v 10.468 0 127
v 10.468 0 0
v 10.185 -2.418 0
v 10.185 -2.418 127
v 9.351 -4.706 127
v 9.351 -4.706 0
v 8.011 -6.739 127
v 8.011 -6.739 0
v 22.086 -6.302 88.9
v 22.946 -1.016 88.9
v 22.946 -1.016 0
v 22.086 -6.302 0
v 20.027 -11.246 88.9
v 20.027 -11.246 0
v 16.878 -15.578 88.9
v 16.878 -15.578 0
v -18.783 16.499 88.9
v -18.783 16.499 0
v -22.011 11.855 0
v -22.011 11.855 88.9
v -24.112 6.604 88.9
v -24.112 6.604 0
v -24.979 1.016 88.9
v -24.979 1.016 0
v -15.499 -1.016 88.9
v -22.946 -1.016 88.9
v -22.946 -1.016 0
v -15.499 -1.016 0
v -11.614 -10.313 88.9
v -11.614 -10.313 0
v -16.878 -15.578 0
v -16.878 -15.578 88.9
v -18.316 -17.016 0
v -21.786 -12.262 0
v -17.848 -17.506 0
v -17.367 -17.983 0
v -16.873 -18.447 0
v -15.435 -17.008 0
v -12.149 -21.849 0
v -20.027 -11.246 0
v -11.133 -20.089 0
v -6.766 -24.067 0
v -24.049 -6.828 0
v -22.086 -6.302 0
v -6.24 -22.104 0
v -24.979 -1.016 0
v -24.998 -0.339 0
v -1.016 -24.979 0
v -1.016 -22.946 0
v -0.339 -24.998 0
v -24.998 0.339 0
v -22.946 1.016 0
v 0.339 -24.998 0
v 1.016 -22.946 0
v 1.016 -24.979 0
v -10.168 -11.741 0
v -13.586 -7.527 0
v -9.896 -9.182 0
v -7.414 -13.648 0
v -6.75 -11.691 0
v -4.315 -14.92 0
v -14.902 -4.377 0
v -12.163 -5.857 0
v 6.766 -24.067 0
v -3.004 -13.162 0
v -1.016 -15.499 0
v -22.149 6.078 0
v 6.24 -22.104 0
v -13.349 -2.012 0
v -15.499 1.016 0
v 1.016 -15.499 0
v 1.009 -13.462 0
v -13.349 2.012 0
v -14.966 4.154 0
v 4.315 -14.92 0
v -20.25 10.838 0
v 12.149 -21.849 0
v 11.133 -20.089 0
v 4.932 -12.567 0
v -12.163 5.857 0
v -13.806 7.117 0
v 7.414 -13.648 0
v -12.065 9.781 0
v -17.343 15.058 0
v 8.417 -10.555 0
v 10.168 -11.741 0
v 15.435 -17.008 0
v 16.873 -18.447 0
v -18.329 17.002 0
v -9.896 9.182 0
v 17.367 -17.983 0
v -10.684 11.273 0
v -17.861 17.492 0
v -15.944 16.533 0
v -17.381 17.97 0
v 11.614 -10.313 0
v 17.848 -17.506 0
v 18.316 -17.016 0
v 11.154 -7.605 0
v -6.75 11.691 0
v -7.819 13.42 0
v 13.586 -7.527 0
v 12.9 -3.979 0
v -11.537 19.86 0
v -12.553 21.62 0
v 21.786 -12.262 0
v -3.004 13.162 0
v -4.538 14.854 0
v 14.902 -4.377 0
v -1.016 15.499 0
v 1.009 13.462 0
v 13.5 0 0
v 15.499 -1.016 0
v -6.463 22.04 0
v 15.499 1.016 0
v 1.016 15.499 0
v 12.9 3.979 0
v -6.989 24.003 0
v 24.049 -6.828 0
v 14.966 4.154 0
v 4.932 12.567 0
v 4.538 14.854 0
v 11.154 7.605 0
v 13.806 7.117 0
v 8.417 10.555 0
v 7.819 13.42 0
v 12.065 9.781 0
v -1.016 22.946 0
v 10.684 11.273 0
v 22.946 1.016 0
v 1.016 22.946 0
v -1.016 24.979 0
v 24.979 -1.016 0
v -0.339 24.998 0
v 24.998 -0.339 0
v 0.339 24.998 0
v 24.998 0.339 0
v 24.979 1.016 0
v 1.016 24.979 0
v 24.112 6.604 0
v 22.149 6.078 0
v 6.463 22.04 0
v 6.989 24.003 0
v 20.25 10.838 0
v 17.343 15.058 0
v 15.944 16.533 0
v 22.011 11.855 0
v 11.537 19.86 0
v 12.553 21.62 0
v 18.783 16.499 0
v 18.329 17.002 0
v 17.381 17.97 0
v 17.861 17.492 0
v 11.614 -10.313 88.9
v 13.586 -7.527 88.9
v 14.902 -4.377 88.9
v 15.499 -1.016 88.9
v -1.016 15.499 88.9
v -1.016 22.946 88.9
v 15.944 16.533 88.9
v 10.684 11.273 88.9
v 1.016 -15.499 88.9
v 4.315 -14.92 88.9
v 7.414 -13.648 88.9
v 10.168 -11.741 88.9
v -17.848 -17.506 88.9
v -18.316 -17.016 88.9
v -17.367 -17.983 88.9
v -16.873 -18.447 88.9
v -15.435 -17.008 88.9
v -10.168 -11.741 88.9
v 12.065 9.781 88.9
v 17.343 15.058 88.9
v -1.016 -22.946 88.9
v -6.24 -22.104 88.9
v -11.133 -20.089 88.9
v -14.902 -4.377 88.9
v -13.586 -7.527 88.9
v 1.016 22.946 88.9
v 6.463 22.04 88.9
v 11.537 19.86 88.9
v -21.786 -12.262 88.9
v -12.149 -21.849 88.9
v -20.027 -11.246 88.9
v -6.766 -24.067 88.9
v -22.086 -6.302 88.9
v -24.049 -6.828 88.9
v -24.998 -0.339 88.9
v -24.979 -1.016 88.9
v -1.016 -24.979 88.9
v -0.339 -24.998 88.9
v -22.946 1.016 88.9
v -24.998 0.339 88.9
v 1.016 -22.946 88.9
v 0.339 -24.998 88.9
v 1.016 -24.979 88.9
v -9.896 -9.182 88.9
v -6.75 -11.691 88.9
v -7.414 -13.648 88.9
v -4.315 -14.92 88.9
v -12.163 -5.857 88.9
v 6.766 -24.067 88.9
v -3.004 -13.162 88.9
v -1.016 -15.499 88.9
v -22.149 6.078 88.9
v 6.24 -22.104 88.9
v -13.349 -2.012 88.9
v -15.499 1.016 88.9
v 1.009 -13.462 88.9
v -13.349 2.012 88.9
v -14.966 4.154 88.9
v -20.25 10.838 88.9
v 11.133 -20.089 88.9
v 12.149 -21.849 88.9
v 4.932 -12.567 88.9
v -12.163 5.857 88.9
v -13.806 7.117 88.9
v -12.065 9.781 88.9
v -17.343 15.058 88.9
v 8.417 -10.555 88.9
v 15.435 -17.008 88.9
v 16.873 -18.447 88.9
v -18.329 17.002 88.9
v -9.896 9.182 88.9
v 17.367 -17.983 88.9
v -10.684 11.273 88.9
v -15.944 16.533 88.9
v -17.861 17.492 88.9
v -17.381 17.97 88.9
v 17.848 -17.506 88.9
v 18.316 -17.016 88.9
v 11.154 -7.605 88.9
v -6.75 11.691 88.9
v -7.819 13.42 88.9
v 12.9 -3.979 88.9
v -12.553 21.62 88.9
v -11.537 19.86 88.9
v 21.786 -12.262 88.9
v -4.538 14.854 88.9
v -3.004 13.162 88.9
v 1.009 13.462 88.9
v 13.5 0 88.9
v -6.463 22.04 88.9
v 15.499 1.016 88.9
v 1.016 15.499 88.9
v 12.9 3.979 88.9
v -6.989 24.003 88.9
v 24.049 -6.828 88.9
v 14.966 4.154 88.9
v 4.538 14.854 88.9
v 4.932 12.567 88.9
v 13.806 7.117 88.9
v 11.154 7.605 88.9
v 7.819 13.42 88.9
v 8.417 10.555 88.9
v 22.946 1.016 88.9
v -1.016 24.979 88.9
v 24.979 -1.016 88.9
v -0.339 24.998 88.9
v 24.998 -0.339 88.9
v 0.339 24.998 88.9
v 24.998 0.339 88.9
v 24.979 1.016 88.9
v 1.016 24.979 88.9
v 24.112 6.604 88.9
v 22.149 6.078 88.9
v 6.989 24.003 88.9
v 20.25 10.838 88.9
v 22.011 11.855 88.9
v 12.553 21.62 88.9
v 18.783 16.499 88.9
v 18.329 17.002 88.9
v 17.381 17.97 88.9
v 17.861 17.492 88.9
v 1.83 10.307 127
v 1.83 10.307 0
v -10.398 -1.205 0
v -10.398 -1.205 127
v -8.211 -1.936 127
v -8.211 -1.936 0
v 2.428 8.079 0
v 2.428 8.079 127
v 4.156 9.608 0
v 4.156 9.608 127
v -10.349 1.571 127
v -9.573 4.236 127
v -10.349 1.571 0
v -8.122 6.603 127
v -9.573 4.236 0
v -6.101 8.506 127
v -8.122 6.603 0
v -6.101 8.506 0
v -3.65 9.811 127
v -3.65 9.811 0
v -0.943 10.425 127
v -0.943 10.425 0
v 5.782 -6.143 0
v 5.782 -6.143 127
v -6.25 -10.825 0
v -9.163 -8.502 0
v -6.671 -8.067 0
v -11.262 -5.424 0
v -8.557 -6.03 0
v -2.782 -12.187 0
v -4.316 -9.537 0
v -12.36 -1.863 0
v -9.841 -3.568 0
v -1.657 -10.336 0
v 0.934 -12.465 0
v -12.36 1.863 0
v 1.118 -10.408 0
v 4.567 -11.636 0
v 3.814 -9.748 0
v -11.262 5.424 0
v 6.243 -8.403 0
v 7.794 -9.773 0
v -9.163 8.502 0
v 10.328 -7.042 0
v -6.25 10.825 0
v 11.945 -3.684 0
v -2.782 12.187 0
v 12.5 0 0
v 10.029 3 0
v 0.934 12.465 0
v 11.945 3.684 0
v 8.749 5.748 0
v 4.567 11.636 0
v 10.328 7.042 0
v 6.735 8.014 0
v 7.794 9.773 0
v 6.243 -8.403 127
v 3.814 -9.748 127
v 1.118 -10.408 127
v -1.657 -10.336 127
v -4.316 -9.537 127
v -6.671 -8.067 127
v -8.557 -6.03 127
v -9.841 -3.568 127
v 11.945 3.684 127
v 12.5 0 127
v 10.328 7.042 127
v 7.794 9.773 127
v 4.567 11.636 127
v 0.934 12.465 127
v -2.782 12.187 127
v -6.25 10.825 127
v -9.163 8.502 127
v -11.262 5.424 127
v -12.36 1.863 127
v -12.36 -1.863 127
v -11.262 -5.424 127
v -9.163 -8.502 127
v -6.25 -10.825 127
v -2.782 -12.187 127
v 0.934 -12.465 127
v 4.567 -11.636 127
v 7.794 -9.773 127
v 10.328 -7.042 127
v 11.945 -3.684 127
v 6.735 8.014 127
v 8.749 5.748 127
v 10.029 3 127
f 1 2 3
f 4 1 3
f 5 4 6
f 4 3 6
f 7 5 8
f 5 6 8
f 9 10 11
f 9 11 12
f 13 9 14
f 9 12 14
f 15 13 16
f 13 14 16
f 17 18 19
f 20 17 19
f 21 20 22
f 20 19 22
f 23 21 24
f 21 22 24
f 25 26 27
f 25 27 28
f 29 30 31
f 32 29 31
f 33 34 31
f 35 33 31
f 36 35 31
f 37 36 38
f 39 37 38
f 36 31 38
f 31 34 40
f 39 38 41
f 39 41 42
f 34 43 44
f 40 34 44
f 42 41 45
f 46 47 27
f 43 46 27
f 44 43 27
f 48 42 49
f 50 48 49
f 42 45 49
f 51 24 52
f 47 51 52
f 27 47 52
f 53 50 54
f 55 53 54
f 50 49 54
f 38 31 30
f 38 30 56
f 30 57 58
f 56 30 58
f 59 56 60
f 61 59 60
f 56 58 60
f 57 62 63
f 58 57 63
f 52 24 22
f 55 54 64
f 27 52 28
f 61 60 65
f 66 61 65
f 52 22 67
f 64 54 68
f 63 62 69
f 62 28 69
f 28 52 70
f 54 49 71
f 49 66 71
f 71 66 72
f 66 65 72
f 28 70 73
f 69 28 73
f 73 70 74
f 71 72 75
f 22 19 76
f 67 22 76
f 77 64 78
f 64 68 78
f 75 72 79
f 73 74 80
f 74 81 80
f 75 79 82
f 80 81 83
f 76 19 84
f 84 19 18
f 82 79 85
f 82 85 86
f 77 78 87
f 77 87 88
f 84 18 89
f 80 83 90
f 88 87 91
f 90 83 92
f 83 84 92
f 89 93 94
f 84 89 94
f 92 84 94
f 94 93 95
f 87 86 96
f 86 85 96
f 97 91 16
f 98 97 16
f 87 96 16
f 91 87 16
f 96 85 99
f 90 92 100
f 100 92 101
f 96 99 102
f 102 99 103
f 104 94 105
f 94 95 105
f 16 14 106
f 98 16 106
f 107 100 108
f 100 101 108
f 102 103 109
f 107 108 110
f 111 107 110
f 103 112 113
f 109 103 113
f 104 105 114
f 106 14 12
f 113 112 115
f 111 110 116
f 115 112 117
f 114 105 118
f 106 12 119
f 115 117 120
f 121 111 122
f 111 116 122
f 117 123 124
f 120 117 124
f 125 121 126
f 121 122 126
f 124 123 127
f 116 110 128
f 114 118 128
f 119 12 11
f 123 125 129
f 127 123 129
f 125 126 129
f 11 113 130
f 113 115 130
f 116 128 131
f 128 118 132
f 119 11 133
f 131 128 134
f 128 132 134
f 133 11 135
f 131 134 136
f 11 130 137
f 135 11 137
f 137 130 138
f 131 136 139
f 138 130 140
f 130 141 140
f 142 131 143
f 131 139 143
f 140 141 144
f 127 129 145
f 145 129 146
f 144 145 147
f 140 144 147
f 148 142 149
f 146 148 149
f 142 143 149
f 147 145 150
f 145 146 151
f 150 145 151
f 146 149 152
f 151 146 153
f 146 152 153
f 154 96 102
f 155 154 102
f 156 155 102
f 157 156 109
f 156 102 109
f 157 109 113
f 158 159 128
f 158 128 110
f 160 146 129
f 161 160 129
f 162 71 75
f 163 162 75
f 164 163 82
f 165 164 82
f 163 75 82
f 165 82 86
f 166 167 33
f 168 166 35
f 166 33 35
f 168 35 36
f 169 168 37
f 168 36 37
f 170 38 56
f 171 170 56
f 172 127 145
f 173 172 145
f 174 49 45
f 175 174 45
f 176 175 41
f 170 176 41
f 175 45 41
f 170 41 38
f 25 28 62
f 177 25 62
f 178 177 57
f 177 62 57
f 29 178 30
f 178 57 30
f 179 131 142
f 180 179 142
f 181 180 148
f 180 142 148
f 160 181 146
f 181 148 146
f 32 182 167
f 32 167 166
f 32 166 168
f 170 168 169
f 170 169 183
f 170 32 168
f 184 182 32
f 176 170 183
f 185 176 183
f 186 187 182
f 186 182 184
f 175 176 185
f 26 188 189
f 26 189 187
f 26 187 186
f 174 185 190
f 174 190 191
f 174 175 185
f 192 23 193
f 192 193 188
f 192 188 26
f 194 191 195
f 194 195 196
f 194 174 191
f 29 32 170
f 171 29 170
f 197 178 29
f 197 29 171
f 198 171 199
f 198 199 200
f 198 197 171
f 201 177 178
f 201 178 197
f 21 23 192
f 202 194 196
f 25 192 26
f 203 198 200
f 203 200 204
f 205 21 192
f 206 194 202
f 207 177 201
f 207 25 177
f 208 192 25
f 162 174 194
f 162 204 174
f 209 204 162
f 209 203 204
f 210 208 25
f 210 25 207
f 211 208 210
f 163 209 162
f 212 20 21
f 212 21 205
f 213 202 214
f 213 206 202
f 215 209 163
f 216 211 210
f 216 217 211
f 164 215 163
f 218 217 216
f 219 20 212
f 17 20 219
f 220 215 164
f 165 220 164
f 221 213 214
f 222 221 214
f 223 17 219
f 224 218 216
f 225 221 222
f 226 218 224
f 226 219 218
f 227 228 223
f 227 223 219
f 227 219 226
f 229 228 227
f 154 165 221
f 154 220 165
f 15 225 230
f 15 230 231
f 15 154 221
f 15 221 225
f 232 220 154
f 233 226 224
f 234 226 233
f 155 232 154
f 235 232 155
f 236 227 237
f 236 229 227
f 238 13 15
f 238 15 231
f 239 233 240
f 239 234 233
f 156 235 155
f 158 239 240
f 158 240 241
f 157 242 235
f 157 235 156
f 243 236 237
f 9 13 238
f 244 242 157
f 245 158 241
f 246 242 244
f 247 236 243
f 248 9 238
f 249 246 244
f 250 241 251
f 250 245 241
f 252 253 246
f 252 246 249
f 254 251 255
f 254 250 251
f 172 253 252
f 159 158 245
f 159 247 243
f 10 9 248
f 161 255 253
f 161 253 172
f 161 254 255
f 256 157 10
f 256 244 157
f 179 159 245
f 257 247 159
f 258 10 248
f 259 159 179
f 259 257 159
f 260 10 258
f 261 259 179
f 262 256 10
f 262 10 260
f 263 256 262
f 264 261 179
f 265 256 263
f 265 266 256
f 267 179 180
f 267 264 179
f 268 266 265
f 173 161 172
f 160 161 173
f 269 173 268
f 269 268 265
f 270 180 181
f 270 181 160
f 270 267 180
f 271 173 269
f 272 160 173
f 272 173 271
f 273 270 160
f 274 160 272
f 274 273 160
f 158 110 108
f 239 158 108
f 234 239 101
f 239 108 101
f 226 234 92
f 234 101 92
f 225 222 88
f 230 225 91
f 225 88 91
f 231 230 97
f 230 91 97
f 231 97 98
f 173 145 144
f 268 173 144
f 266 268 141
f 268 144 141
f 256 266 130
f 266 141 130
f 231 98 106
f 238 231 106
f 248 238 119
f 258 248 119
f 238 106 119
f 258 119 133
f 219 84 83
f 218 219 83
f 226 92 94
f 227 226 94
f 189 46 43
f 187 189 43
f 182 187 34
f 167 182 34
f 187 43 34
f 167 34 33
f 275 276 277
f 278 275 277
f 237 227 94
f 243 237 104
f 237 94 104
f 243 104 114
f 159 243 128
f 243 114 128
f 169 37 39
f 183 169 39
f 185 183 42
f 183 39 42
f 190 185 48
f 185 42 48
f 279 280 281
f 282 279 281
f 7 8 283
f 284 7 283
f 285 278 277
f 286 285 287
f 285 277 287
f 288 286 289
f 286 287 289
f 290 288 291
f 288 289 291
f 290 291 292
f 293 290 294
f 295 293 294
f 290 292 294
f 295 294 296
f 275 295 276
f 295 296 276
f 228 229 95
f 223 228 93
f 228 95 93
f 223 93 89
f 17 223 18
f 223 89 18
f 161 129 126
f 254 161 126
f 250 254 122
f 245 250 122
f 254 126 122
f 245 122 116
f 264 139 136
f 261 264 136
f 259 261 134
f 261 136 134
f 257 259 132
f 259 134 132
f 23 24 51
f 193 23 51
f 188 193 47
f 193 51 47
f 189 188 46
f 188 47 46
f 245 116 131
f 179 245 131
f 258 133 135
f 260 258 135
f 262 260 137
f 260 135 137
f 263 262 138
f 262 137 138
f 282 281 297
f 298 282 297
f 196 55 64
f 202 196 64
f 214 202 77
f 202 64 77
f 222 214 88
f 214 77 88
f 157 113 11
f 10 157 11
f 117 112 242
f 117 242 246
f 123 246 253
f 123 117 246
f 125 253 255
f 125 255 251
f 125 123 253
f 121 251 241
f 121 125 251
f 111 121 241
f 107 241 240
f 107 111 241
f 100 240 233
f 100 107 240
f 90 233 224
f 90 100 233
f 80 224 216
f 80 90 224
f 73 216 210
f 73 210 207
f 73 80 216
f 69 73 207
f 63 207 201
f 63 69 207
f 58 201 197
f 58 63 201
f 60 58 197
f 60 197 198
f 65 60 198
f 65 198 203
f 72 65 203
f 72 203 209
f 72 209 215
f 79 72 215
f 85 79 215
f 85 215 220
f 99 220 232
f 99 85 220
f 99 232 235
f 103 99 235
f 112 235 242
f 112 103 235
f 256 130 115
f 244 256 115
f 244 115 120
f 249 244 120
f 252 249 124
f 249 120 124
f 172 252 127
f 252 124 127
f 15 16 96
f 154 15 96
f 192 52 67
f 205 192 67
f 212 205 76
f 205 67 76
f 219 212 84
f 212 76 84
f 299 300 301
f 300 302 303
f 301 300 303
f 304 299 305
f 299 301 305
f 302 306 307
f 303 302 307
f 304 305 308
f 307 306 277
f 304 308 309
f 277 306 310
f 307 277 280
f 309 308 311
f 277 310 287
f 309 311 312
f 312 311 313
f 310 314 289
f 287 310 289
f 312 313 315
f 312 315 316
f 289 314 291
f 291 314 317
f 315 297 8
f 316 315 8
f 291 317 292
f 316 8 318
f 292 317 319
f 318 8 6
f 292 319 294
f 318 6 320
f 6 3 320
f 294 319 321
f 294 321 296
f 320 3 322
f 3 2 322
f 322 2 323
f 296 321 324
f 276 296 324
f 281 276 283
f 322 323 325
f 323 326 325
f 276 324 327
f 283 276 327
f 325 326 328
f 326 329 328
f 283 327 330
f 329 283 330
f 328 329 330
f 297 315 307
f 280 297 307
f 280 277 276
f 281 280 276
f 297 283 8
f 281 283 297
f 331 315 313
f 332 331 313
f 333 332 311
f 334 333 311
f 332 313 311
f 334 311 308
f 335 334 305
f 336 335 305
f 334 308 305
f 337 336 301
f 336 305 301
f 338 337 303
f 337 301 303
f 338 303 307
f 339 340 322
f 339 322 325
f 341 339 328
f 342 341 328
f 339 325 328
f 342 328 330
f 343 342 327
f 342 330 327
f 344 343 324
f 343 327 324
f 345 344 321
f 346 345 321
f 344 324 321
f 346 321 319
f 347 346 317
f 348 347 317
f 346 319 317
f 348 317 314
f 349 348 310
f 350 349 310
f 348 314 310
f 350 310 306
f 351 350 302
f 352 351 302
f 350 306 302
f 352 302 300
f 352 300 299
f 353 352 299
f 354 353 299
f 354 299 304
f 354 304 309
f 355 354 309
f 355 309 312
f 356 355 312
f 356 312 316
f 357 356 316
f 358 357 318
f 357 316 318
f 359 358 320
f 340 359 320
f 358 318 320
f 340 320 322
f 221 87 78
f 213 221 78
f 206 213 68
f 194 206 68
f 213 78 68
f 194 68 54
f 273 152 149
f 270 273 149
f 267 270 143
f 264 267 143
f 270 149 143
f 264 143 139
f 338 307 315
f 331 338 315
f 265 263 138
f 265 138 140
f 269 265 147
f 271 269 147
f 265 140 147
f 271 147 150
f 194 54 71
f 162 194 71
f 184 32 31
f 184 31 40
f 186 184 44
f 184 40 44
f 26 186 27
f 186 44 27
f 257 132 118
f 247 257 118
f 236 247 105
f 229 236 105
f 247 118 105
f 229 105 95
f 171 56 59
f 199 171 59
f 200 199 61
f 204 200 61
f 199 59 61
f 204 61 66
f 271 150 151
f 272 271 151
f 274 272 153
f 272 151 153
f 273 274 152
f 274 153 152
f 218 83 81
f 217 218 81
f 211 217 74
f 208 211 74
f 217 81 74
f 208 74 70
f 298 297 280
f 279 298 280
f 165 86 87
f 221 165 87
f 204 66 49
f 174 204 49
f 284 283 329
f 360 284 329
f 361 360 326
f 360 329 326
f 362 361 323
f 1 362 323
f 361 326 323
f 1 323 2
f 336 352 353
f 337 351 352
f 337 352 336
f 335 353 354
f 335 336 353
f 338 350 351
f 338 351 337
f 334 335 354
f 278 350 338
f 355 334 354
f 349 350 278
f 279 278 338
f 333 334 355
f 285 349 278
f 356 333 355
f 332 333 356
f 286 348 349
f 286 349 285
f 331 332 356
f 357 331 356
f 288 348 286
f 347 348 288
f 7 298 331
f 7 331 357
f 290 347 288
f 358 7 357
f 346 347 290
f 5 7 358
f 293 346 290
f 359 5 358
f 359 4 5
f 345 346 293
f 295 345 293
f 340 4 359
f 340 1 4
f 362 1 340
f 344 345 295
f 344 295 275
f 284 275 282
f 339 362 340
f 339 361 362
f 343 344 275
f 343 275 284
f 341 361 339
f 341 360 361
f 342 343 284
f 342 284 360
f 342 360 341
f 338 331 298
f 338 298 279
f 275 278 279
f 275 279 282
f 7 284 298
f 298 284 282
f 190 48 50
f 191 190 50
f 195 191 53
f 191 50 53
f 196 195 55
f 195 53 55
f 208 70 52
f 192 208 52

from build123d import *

# Parameters (mm, degrees)
F0_R     = 13.5
F1_DEPTH = 88.9
F0_R_2   = 12.5
F2_DEPTH = 127


# Not quite as in the source:
# - a feature names something its author has since deleted; it is built from what else it names


with BuildPart() as f1:
    # F0 (on Top) → F1 (new body)
    with BuildSketch(Plane.XY):
        with BuildLine():
            ThreePointArc((15.4987343999, -1.016), (15.5236813723, -0.5082722204), (15.532, 0))
            ThreePointArc((15.532, 0), (15.5236813723, 0.5082722204), (15.4987343999, 1.016))
            ThreePointArc((15.4987343999, 1.016), (14.4620963919, 5.664873516), (12.0654338858, 9.7810188195))
            ThreePointArc((12.0654338858, 9.7810188195), (11.3992660397, 10.549870035), (10.6841963244, 11.2734632169))
            ThreePointArc((10.6841963244, 11.2734632169), (6.2198776234, 14.2322221157), (1.016, 15.4987343999))
            ThreePointArc((1.016, 15.4987343999), (0, 15.532), (-1.016, 15.4987343999))
            ThreePointArc((-1.016, 15.4987343999), (-6.2198776234, 14.2322221157), (-10.6841963244, 11.2734632169))
            ThreePointArc((-10.6841963244, 11.2734632169), (-11.3992660397, 10.549870035), (-12.0654338858, 9.7810188195))
            ThreePointArc((-12.0654338858, 9.7810188195), (-14.4620963919, 5.664873516), (-15.4987343999, 1.016))
            ThreePointArc((-15.4987343999, 1.016), (-15.532, 0), (-15.4987343999, -1.016))
            ThreePointArc((-15.4987343999, -1.016), (-14.3311091034, -5.9885170007), (-11.6136432015, -10.3134046555))
            ThreePointArc((-11.6136432015, -10.3134046555), (-10.9141214099, -11.0510170504), (-10.1678472471, -11.7412906599))
            ThreePointArc((-10.1678472471, -11.7412906599), (-5.8990851559, -14.3681529197), (-1.016, -15.4987343999))
            ThreePointArc((-1.016, -15.4987343999), (0, -15.532), (1.016, -15.4987343999))
            ThreePointArc((1.016, -15.4987343999), (5.8990851559, -14.3681529197), (10.1678472471, -11.7412906599))
            ThreePointArc((10.1678472471, -11.7412906599), (10.9141214099, -11.0510170504), (11.6136432015, -10.3134046555))
            ThreePointArc((11.6136432015, -10.3134046555), (14.3311091034, -5.9885170007), (15.4987343999, -1.016))
        make_face()
        Circle(F0_R, mode=Mode.SUBTRACT)
        with BuildLine():
            ThreePointArc((-12.0654338858, 9.7810188195), (-11.3992660397, 10.549870035), (-10.6841963244, 11.2734632169))
            Line((-10.6841963244, 11.2734632169), (-15.9435223337, 16.5327892262))
            ThreePointArc((-15.9435223337, 16.5327892262), (-16.6594901874, 15.8110850575), (-17.3428209151, 15.0584058488))
            Line((-17.3428209151, 15.0584058488), (-12.0654338858, 9.7810188195))
        make_face()
        with BuildLine():
            ThreePointArc((-17.3428209151, 15.0584058488), (-16.6594901874, 15.8110850575), (-15.9435223337, 16.5327892262))
            Line((-15.9435223337, 16.5327892262), (-17.3805805873, 17.9698474798))
            ThreePointArc((-17.3805805873, 17.9698474798), (-18.0967183071, 17.2484430171), (-18.782937732, 16.4985226658))
            Line((-18.782937732, 16.4985226658), (-17.3428209151, 15.0584058488))
        make_face()
        with BuildLine():
            ThreePointArc((-15.4987343999, -1.016), (-15.532, 0), (-15.4987343999, 1.016))
            Line((-15.4987343999, 1.016), (-22.9455173836, 1.016))
            Line((-22.9455173836, 1.016), (-24.9793463485, 1.016))
            ThreePointArc((-24.9793463485, 1.016), (-25, 0), (-24.9793463485, -1.016))
            Line((-24.9793463485, -1.016), (-22.9455173836, -1.016))
            Line((-22.9455173836, -1.016), (-15.4987343999, -1.016))
        make_face()
        with BuildLine():
            ThreePointArc((10.6841963244, 11.2734632169), (11.3992660397, 10.549870035), (12.0654338858, 9.7810188195))
            Line((12.0654338858, 9.7810188195), (17.3428209151, 15.0584058488))
            ThreePointArc((17.3428209151, 15.0584058488), (16.6594901874, 15.8110850575), (15.9435223337, 16.5327892262))
            Line((15.9435223337, 16.5327892262), (10.6841963244, 11.2734632169))
        make_face()
        with BuildLine():
            ThreePointArc((15.9435223337, 16.5327892262), (16.6594901874, 15.8110850575), (17.3428209151, 15.0584058488))
            Line((17.3428209151, 15.0584058488), (18.782937732, 16.4985226658))
            ThreePointArc((18.782937732, 16.4985226658), (18.0967183071, 17.2484430171), (17.3805805873, 17.9698474798))
            Line((17.3805805873, 17.9698474798), (15.9435223337, 16.5327892262))
        make_face()
        with BuildLine():
            ThreePointArc((15.4987343999, 1.016), (15.5236813723, 0.5082722204), (15.532, 0))
            ThreePointArc((15.532, 0), (15.5236813723, -0.5082722204), (15.4987343999, -1.016))
            Line((15.4987343999, -1.016), (22.9455173836, -1.016))
            ThreePointArc((22.9455173836, -1.016), (22.968, 0), (22.9455173836, 1.016))
            Line((22.9455173836, 1.016), (15.4987343999, 1.016))
        make_face()
        with BuildLine():
            Line((24.9793463485, 1.016), (22.9455173836, 1.016))
            ThreePointArc((22.9455173836, 1.016), (22.968, 0), (22.9455173836, -1.016))
            Line((22.9455173836, -1.016), (24.9793463485, -1.016))
            ThreePointArc((24.9793463485, -1.016), (25, 0), (24.9793463485, 1.016))
        make_face()
        with BuildLine():
            ThreePointArc((-1.016, 15.4987343999), (0, 15.532), (1.016, 15.4987343999))
            Line((1.016, 15.4987343999), (1.016, 22.9455173836))
            ThreePointArc((1.016, 22.9455173836), (0, 22.968), (-1.016, 22.9455173836))
            Line((-1.016, 22.9455173836), (-1.016, 15.4987343999))
        make_face()
        with BuildLine():
            ThreePointArc((-1.016, 22.9455173836), (0, 22.968), (1.016, 22.9455173836))
            Line((1.016, 22.9455173836), (1.016, 24.9793463485))
            ThreePointArc((1.016, 24.9793463485), (0, 25), (-1.016, 24.9793463485))
            Line((-1.016, 24.9793463485), (-1.016, 22.9455173836))
        make_face()
        with BuildLine():
            Line((1.016, -24.9793463485), (1.016, -22.9455173836))
            ThreePointArc((1.016, -22.9455173836), (0, -22.968), (-1.016, -22.9455173836))
            Line((-1.016, -22.9455173836), (-1.016, -24.9793463485))
            ThreePointArc((-1.016, -24.9793463485), (0, -25), (1.016, -24.9793463485))
        make_face()
        with BuildLine():
            Line((1.016, -22.9455173836), (1.016, -15.4987343999))
            ThreePointArc((1.016, -15.4987343999), (0, -15.532), (-1.016, -15.4987343999))
            Line((-1.016, -15.4987343999), (-1.016, -22.9455173836))
            ThreePointArc((-1.016, -22.9455173836), (0, -22.968), (1.016, -22.9455173836))
        make_face()
        with BuildLine():
            Line((-15.4350408661, -17.0084842788), (-10.1678472471, -11.7412906599))
            ThreePointArc((-10.1678472471, -11.7412906599), (-10.9141214099, -11.0510170504), (-11.6136432015, -10.3134046555))
            Line((-11.6136432015, -10.3134046555), (-16.8779304911, -15.5776919451))
            ThreePointArc((-16.8779304911, -15.5776919451), (-16.1723165056, -16.309052788), (-15.4350408661, -17.0084842788))
        make_face()
        with BuildLine():
            Line((-16.8734331332, -18.4468765459), (-15.4350408661, -17.0084842788))
            ThreePointArc((-15.4350408661, -17.0084842788), (-16.1723165056, -16.309052788), (-16.8779304911, -15.5776919451))
            Line((-16.8779304911, -15.5776919451), (-18.3158302672, -17.0155917212))
            ThreePointArc((-18.3158302672, -17.0155917212), (-17.6091796722, -17.7458950542), (-16.8734331332, -18.4468765459))
        make_face()
        with BuildLine():
            Line((16.8779304911, -15.5776919451), (11.6136432015, -10.3134046555))
            ThreePointArc((11.6136432015, -10.3134046555), (10.9141214099, -11.0510170504), (10.1678472471, -11.7412906599))
            Line((10.1678472471, -11.7412906599), (15.4350408661, -17.0084842788))
            ThreePointArc((15.4350408661, -17.0084842788), (16.1723165056, -16.309052788), (16.8779304911, -15.5776919451))
        make_face()
        with BuildLine():
            Line((18.3158302672, -17.0155917212), (16.8779304911, -15.5776919451))
            ThreePointArc((16.8779304911, -15.5776919451), (16.1723165056, -16.309052788), (15.4350408661, -17.0084842788))
            Line((15.4350408661, -17.0084842788), (16.8734331332, -18.4468765459))
            ThreePointArc((16.8734331332, -18.4468765459), (17.6091796722, -17.7458950542), (18.3158302672, -17.0155917212))
        make_face()
        with BuildLine():
            Line((16.8734331332, -18.4468765459), (15.4350408661, -17.0084842788))
            ThreePointArc((15.4350408661, -17.0084842788), (8.7447856987, -21.2381201401), (1.016, -22.9455173836))
            Line((1.016, -22.9455173836), (1.016, -24.9793463485))
            ThreePointArc((1.016, -24.9793463485), (9.5224075153, -23.1154440821), (16.8734331332, -18.4468765459))
        make_face()
        with BuildLine():
            Line((24.9793463485, -1.016), (22.9455173836, -1.016))
            ThreePointArc((22.9455173836, -1.016), (21.2011195042, -8.8341131851), (16.8779304911, -15.5776919451))
            Line((16.8779304911, -15.5776919451), (18.3158302672, -17.0155917212))
            ThreePointArc((18.3158302672, -17.0155917212), (23.0784491108, -9.6117213152), (24.9793463485, -1.016))
        make_face()
        with BuildLine():
            ThreePointArc((17.3428209151, 15.0584058488), (21.3327176239, 8.5114148517), (22.9455173836, 1.016))
            Line((22.9455173836, 1.016), (24.9793463485, 1.016))
            ThreePointArc((24.9793463485, 1.016), (23.2101594999, 9.2891601336), (18.782937732, 16.4985226658))
            Line((18.782937732, 16.4985226658), (17.3428209151, 15.0584058488))
        make_face()
        with BuildLine():
            Line((-1.016, -24.9793463485), (-1.016, -22.9455173836))
            ThreePointArc((-1.016, -22.9455173836), (-8.7447856987, -21.2381201401), (-15.4350408661, -17.0084842788))
            Line((-15.4350408661, -17.0084842788), (-16.8734331332, -18.4468765459))
            ThreePointArc((-16.8734331332, -18.4468765459), (-9.5224075153, -23.1154440821), (-1.016, -24.9793463485))
        make_face()
        with BuildLine():
            Line((-18.3158302672, -17.0155917212), (-16.8779304911, -15.5776919451))
            ThreePointArc((-16.8779304911, -15.5776919451), (-21.2011195042, -8.8341131851), (-22.9455173836, -1.016))
            Line((-22.9455173836, -1.016), (-24.9793463485, -1.016))
            ThreePointArc((-24.9793463485, -1.016), (-23.0784491108, -9.6117213152), (-18.3158302672, -17.0155917212))
        make_face()
        with BuildLine():
            ThreePointArc((-22.9455173836, 1.016), (-21.3327176239, 8.5114148517), (-17.3428209151, 15.0584058488))
            Line((-17.3428209151, 15.0584058488), (-18.782937732, 16.4985226658))
            ThreePointArc((-18.782937732, 16.4985226658), (-23.2101594999, 9.2891601336), (-24.9793463485, 1.016))
            Line((-24.9793463485, 1.016), (-22.9455173836, 1.016))
        make_face()
        with BuildLine():
            ThreePointArc((-15.9435223337, 16.5327892262), (-9.065711227, 21.1031254545), (-1.016, 22.9455173836))
            Line((-1.016, 22.9455173836), (-1.016, 24.9793463485))
            ThreePointArc((-1.016, 24.9793463485), (-9.8433639029, 22.9806045846), (-17.3805805873, 17.9698474798))
            Line((-17.3805805873, 17.9698474798), (-15.9435223337, 16.5327892262))
        make_face()
        with BuildLine():
            ThreePointArc((1.016, 22.9455173836), (9.065711227, 21.1031254545), (15.9435223337, 16.5327892262))
            Line((15.9435223337, 16.5327892262), (17.3805805873, 17.9698474798))
            ThreePointArc((17.3805805873, 17.9698474798), (9.8433639029, 22.9806045846), (1.016, 24.9793463485))
            Line((1.016, 24.9793463485), (1.016, 22.9455173836))
        make_face()
    extrude(amount=F1_DEPTH)


with BuildPart() as f2:
    # F0 (on Top) → F2 (new body)
    with BuildSketch(Plane.XY):
        Circle(F0_R_2)
        with BuildLine():
            ThreePointArc((4.1556189742, 9.6078017747), (8.748715432, 5.7479563576), (10.468, 0))
            ThreePointArc((10.468, 0), (9.8344886963, -3.5863429958), (8.010633534, -6.7386032963))
            ThreePointArc((8.010633534, -6.7386032963), (7.1751231328, -7.6221146691), (6.2427909243, -8.4027724874))
            ThreePointArc((6.2427909243, -8.4027724874), (-3.0133833676, -10.0248962428), (-9.8411184076, -3.5681104927))
            ThreePointArc((-9.8411184076, -3.5681104927), (-10.1885065004, -2.4027815737), (-10.3984098985, -1.2050292872))
            ThreePointArc((-10.3984098985, -1.2050292872), (-7.1751231328, 7.6221146691), (1.8304848736, 10.306713789))
            ThreePointArc((1.8304848736, 10.306713789), (3.0133833676, 10.0248962428), (4.1556189742, 9.6078017747))
        make_face(mode=Mode.SUBTRACT)
        with BuildLine():
            Line((8.010633534, -6.7386032963), (4.1556189742, 9.6078017747))
            ThreePointArc((4.1556189742, 9.6078017747), (3.0133833676, 10.0248962428), (1.8304848736, 10.306713789))
            Line((1.8304848736, 10.306713789), (-10.3984098985, -1.2050292872))
            ThreePointArc((-10.3984098985, -1.2050292872), (-10.1885065004, -2.4027815737), (-9.8411184076, -3.5681104927))
            Line((-9.8411184076, -3.5681104927), (6.2427909243, -8.4027724874))
            ThreePointArc((6.2427909243, -8.4027724874), (7.1751231328, -7.6221146691), (8.010633534, -6.7386032963))
        make_face()
        Polygon((5.7823212408, -6.1425448365), (-8.2107604927, -1.9363646691), (2.4284392519, 8.0789095056), align=None, mode=Mode.SUBTRACT)
    extrude(amount=F2_DEPTH)


solid = Compound([f1.part, f2.part])
